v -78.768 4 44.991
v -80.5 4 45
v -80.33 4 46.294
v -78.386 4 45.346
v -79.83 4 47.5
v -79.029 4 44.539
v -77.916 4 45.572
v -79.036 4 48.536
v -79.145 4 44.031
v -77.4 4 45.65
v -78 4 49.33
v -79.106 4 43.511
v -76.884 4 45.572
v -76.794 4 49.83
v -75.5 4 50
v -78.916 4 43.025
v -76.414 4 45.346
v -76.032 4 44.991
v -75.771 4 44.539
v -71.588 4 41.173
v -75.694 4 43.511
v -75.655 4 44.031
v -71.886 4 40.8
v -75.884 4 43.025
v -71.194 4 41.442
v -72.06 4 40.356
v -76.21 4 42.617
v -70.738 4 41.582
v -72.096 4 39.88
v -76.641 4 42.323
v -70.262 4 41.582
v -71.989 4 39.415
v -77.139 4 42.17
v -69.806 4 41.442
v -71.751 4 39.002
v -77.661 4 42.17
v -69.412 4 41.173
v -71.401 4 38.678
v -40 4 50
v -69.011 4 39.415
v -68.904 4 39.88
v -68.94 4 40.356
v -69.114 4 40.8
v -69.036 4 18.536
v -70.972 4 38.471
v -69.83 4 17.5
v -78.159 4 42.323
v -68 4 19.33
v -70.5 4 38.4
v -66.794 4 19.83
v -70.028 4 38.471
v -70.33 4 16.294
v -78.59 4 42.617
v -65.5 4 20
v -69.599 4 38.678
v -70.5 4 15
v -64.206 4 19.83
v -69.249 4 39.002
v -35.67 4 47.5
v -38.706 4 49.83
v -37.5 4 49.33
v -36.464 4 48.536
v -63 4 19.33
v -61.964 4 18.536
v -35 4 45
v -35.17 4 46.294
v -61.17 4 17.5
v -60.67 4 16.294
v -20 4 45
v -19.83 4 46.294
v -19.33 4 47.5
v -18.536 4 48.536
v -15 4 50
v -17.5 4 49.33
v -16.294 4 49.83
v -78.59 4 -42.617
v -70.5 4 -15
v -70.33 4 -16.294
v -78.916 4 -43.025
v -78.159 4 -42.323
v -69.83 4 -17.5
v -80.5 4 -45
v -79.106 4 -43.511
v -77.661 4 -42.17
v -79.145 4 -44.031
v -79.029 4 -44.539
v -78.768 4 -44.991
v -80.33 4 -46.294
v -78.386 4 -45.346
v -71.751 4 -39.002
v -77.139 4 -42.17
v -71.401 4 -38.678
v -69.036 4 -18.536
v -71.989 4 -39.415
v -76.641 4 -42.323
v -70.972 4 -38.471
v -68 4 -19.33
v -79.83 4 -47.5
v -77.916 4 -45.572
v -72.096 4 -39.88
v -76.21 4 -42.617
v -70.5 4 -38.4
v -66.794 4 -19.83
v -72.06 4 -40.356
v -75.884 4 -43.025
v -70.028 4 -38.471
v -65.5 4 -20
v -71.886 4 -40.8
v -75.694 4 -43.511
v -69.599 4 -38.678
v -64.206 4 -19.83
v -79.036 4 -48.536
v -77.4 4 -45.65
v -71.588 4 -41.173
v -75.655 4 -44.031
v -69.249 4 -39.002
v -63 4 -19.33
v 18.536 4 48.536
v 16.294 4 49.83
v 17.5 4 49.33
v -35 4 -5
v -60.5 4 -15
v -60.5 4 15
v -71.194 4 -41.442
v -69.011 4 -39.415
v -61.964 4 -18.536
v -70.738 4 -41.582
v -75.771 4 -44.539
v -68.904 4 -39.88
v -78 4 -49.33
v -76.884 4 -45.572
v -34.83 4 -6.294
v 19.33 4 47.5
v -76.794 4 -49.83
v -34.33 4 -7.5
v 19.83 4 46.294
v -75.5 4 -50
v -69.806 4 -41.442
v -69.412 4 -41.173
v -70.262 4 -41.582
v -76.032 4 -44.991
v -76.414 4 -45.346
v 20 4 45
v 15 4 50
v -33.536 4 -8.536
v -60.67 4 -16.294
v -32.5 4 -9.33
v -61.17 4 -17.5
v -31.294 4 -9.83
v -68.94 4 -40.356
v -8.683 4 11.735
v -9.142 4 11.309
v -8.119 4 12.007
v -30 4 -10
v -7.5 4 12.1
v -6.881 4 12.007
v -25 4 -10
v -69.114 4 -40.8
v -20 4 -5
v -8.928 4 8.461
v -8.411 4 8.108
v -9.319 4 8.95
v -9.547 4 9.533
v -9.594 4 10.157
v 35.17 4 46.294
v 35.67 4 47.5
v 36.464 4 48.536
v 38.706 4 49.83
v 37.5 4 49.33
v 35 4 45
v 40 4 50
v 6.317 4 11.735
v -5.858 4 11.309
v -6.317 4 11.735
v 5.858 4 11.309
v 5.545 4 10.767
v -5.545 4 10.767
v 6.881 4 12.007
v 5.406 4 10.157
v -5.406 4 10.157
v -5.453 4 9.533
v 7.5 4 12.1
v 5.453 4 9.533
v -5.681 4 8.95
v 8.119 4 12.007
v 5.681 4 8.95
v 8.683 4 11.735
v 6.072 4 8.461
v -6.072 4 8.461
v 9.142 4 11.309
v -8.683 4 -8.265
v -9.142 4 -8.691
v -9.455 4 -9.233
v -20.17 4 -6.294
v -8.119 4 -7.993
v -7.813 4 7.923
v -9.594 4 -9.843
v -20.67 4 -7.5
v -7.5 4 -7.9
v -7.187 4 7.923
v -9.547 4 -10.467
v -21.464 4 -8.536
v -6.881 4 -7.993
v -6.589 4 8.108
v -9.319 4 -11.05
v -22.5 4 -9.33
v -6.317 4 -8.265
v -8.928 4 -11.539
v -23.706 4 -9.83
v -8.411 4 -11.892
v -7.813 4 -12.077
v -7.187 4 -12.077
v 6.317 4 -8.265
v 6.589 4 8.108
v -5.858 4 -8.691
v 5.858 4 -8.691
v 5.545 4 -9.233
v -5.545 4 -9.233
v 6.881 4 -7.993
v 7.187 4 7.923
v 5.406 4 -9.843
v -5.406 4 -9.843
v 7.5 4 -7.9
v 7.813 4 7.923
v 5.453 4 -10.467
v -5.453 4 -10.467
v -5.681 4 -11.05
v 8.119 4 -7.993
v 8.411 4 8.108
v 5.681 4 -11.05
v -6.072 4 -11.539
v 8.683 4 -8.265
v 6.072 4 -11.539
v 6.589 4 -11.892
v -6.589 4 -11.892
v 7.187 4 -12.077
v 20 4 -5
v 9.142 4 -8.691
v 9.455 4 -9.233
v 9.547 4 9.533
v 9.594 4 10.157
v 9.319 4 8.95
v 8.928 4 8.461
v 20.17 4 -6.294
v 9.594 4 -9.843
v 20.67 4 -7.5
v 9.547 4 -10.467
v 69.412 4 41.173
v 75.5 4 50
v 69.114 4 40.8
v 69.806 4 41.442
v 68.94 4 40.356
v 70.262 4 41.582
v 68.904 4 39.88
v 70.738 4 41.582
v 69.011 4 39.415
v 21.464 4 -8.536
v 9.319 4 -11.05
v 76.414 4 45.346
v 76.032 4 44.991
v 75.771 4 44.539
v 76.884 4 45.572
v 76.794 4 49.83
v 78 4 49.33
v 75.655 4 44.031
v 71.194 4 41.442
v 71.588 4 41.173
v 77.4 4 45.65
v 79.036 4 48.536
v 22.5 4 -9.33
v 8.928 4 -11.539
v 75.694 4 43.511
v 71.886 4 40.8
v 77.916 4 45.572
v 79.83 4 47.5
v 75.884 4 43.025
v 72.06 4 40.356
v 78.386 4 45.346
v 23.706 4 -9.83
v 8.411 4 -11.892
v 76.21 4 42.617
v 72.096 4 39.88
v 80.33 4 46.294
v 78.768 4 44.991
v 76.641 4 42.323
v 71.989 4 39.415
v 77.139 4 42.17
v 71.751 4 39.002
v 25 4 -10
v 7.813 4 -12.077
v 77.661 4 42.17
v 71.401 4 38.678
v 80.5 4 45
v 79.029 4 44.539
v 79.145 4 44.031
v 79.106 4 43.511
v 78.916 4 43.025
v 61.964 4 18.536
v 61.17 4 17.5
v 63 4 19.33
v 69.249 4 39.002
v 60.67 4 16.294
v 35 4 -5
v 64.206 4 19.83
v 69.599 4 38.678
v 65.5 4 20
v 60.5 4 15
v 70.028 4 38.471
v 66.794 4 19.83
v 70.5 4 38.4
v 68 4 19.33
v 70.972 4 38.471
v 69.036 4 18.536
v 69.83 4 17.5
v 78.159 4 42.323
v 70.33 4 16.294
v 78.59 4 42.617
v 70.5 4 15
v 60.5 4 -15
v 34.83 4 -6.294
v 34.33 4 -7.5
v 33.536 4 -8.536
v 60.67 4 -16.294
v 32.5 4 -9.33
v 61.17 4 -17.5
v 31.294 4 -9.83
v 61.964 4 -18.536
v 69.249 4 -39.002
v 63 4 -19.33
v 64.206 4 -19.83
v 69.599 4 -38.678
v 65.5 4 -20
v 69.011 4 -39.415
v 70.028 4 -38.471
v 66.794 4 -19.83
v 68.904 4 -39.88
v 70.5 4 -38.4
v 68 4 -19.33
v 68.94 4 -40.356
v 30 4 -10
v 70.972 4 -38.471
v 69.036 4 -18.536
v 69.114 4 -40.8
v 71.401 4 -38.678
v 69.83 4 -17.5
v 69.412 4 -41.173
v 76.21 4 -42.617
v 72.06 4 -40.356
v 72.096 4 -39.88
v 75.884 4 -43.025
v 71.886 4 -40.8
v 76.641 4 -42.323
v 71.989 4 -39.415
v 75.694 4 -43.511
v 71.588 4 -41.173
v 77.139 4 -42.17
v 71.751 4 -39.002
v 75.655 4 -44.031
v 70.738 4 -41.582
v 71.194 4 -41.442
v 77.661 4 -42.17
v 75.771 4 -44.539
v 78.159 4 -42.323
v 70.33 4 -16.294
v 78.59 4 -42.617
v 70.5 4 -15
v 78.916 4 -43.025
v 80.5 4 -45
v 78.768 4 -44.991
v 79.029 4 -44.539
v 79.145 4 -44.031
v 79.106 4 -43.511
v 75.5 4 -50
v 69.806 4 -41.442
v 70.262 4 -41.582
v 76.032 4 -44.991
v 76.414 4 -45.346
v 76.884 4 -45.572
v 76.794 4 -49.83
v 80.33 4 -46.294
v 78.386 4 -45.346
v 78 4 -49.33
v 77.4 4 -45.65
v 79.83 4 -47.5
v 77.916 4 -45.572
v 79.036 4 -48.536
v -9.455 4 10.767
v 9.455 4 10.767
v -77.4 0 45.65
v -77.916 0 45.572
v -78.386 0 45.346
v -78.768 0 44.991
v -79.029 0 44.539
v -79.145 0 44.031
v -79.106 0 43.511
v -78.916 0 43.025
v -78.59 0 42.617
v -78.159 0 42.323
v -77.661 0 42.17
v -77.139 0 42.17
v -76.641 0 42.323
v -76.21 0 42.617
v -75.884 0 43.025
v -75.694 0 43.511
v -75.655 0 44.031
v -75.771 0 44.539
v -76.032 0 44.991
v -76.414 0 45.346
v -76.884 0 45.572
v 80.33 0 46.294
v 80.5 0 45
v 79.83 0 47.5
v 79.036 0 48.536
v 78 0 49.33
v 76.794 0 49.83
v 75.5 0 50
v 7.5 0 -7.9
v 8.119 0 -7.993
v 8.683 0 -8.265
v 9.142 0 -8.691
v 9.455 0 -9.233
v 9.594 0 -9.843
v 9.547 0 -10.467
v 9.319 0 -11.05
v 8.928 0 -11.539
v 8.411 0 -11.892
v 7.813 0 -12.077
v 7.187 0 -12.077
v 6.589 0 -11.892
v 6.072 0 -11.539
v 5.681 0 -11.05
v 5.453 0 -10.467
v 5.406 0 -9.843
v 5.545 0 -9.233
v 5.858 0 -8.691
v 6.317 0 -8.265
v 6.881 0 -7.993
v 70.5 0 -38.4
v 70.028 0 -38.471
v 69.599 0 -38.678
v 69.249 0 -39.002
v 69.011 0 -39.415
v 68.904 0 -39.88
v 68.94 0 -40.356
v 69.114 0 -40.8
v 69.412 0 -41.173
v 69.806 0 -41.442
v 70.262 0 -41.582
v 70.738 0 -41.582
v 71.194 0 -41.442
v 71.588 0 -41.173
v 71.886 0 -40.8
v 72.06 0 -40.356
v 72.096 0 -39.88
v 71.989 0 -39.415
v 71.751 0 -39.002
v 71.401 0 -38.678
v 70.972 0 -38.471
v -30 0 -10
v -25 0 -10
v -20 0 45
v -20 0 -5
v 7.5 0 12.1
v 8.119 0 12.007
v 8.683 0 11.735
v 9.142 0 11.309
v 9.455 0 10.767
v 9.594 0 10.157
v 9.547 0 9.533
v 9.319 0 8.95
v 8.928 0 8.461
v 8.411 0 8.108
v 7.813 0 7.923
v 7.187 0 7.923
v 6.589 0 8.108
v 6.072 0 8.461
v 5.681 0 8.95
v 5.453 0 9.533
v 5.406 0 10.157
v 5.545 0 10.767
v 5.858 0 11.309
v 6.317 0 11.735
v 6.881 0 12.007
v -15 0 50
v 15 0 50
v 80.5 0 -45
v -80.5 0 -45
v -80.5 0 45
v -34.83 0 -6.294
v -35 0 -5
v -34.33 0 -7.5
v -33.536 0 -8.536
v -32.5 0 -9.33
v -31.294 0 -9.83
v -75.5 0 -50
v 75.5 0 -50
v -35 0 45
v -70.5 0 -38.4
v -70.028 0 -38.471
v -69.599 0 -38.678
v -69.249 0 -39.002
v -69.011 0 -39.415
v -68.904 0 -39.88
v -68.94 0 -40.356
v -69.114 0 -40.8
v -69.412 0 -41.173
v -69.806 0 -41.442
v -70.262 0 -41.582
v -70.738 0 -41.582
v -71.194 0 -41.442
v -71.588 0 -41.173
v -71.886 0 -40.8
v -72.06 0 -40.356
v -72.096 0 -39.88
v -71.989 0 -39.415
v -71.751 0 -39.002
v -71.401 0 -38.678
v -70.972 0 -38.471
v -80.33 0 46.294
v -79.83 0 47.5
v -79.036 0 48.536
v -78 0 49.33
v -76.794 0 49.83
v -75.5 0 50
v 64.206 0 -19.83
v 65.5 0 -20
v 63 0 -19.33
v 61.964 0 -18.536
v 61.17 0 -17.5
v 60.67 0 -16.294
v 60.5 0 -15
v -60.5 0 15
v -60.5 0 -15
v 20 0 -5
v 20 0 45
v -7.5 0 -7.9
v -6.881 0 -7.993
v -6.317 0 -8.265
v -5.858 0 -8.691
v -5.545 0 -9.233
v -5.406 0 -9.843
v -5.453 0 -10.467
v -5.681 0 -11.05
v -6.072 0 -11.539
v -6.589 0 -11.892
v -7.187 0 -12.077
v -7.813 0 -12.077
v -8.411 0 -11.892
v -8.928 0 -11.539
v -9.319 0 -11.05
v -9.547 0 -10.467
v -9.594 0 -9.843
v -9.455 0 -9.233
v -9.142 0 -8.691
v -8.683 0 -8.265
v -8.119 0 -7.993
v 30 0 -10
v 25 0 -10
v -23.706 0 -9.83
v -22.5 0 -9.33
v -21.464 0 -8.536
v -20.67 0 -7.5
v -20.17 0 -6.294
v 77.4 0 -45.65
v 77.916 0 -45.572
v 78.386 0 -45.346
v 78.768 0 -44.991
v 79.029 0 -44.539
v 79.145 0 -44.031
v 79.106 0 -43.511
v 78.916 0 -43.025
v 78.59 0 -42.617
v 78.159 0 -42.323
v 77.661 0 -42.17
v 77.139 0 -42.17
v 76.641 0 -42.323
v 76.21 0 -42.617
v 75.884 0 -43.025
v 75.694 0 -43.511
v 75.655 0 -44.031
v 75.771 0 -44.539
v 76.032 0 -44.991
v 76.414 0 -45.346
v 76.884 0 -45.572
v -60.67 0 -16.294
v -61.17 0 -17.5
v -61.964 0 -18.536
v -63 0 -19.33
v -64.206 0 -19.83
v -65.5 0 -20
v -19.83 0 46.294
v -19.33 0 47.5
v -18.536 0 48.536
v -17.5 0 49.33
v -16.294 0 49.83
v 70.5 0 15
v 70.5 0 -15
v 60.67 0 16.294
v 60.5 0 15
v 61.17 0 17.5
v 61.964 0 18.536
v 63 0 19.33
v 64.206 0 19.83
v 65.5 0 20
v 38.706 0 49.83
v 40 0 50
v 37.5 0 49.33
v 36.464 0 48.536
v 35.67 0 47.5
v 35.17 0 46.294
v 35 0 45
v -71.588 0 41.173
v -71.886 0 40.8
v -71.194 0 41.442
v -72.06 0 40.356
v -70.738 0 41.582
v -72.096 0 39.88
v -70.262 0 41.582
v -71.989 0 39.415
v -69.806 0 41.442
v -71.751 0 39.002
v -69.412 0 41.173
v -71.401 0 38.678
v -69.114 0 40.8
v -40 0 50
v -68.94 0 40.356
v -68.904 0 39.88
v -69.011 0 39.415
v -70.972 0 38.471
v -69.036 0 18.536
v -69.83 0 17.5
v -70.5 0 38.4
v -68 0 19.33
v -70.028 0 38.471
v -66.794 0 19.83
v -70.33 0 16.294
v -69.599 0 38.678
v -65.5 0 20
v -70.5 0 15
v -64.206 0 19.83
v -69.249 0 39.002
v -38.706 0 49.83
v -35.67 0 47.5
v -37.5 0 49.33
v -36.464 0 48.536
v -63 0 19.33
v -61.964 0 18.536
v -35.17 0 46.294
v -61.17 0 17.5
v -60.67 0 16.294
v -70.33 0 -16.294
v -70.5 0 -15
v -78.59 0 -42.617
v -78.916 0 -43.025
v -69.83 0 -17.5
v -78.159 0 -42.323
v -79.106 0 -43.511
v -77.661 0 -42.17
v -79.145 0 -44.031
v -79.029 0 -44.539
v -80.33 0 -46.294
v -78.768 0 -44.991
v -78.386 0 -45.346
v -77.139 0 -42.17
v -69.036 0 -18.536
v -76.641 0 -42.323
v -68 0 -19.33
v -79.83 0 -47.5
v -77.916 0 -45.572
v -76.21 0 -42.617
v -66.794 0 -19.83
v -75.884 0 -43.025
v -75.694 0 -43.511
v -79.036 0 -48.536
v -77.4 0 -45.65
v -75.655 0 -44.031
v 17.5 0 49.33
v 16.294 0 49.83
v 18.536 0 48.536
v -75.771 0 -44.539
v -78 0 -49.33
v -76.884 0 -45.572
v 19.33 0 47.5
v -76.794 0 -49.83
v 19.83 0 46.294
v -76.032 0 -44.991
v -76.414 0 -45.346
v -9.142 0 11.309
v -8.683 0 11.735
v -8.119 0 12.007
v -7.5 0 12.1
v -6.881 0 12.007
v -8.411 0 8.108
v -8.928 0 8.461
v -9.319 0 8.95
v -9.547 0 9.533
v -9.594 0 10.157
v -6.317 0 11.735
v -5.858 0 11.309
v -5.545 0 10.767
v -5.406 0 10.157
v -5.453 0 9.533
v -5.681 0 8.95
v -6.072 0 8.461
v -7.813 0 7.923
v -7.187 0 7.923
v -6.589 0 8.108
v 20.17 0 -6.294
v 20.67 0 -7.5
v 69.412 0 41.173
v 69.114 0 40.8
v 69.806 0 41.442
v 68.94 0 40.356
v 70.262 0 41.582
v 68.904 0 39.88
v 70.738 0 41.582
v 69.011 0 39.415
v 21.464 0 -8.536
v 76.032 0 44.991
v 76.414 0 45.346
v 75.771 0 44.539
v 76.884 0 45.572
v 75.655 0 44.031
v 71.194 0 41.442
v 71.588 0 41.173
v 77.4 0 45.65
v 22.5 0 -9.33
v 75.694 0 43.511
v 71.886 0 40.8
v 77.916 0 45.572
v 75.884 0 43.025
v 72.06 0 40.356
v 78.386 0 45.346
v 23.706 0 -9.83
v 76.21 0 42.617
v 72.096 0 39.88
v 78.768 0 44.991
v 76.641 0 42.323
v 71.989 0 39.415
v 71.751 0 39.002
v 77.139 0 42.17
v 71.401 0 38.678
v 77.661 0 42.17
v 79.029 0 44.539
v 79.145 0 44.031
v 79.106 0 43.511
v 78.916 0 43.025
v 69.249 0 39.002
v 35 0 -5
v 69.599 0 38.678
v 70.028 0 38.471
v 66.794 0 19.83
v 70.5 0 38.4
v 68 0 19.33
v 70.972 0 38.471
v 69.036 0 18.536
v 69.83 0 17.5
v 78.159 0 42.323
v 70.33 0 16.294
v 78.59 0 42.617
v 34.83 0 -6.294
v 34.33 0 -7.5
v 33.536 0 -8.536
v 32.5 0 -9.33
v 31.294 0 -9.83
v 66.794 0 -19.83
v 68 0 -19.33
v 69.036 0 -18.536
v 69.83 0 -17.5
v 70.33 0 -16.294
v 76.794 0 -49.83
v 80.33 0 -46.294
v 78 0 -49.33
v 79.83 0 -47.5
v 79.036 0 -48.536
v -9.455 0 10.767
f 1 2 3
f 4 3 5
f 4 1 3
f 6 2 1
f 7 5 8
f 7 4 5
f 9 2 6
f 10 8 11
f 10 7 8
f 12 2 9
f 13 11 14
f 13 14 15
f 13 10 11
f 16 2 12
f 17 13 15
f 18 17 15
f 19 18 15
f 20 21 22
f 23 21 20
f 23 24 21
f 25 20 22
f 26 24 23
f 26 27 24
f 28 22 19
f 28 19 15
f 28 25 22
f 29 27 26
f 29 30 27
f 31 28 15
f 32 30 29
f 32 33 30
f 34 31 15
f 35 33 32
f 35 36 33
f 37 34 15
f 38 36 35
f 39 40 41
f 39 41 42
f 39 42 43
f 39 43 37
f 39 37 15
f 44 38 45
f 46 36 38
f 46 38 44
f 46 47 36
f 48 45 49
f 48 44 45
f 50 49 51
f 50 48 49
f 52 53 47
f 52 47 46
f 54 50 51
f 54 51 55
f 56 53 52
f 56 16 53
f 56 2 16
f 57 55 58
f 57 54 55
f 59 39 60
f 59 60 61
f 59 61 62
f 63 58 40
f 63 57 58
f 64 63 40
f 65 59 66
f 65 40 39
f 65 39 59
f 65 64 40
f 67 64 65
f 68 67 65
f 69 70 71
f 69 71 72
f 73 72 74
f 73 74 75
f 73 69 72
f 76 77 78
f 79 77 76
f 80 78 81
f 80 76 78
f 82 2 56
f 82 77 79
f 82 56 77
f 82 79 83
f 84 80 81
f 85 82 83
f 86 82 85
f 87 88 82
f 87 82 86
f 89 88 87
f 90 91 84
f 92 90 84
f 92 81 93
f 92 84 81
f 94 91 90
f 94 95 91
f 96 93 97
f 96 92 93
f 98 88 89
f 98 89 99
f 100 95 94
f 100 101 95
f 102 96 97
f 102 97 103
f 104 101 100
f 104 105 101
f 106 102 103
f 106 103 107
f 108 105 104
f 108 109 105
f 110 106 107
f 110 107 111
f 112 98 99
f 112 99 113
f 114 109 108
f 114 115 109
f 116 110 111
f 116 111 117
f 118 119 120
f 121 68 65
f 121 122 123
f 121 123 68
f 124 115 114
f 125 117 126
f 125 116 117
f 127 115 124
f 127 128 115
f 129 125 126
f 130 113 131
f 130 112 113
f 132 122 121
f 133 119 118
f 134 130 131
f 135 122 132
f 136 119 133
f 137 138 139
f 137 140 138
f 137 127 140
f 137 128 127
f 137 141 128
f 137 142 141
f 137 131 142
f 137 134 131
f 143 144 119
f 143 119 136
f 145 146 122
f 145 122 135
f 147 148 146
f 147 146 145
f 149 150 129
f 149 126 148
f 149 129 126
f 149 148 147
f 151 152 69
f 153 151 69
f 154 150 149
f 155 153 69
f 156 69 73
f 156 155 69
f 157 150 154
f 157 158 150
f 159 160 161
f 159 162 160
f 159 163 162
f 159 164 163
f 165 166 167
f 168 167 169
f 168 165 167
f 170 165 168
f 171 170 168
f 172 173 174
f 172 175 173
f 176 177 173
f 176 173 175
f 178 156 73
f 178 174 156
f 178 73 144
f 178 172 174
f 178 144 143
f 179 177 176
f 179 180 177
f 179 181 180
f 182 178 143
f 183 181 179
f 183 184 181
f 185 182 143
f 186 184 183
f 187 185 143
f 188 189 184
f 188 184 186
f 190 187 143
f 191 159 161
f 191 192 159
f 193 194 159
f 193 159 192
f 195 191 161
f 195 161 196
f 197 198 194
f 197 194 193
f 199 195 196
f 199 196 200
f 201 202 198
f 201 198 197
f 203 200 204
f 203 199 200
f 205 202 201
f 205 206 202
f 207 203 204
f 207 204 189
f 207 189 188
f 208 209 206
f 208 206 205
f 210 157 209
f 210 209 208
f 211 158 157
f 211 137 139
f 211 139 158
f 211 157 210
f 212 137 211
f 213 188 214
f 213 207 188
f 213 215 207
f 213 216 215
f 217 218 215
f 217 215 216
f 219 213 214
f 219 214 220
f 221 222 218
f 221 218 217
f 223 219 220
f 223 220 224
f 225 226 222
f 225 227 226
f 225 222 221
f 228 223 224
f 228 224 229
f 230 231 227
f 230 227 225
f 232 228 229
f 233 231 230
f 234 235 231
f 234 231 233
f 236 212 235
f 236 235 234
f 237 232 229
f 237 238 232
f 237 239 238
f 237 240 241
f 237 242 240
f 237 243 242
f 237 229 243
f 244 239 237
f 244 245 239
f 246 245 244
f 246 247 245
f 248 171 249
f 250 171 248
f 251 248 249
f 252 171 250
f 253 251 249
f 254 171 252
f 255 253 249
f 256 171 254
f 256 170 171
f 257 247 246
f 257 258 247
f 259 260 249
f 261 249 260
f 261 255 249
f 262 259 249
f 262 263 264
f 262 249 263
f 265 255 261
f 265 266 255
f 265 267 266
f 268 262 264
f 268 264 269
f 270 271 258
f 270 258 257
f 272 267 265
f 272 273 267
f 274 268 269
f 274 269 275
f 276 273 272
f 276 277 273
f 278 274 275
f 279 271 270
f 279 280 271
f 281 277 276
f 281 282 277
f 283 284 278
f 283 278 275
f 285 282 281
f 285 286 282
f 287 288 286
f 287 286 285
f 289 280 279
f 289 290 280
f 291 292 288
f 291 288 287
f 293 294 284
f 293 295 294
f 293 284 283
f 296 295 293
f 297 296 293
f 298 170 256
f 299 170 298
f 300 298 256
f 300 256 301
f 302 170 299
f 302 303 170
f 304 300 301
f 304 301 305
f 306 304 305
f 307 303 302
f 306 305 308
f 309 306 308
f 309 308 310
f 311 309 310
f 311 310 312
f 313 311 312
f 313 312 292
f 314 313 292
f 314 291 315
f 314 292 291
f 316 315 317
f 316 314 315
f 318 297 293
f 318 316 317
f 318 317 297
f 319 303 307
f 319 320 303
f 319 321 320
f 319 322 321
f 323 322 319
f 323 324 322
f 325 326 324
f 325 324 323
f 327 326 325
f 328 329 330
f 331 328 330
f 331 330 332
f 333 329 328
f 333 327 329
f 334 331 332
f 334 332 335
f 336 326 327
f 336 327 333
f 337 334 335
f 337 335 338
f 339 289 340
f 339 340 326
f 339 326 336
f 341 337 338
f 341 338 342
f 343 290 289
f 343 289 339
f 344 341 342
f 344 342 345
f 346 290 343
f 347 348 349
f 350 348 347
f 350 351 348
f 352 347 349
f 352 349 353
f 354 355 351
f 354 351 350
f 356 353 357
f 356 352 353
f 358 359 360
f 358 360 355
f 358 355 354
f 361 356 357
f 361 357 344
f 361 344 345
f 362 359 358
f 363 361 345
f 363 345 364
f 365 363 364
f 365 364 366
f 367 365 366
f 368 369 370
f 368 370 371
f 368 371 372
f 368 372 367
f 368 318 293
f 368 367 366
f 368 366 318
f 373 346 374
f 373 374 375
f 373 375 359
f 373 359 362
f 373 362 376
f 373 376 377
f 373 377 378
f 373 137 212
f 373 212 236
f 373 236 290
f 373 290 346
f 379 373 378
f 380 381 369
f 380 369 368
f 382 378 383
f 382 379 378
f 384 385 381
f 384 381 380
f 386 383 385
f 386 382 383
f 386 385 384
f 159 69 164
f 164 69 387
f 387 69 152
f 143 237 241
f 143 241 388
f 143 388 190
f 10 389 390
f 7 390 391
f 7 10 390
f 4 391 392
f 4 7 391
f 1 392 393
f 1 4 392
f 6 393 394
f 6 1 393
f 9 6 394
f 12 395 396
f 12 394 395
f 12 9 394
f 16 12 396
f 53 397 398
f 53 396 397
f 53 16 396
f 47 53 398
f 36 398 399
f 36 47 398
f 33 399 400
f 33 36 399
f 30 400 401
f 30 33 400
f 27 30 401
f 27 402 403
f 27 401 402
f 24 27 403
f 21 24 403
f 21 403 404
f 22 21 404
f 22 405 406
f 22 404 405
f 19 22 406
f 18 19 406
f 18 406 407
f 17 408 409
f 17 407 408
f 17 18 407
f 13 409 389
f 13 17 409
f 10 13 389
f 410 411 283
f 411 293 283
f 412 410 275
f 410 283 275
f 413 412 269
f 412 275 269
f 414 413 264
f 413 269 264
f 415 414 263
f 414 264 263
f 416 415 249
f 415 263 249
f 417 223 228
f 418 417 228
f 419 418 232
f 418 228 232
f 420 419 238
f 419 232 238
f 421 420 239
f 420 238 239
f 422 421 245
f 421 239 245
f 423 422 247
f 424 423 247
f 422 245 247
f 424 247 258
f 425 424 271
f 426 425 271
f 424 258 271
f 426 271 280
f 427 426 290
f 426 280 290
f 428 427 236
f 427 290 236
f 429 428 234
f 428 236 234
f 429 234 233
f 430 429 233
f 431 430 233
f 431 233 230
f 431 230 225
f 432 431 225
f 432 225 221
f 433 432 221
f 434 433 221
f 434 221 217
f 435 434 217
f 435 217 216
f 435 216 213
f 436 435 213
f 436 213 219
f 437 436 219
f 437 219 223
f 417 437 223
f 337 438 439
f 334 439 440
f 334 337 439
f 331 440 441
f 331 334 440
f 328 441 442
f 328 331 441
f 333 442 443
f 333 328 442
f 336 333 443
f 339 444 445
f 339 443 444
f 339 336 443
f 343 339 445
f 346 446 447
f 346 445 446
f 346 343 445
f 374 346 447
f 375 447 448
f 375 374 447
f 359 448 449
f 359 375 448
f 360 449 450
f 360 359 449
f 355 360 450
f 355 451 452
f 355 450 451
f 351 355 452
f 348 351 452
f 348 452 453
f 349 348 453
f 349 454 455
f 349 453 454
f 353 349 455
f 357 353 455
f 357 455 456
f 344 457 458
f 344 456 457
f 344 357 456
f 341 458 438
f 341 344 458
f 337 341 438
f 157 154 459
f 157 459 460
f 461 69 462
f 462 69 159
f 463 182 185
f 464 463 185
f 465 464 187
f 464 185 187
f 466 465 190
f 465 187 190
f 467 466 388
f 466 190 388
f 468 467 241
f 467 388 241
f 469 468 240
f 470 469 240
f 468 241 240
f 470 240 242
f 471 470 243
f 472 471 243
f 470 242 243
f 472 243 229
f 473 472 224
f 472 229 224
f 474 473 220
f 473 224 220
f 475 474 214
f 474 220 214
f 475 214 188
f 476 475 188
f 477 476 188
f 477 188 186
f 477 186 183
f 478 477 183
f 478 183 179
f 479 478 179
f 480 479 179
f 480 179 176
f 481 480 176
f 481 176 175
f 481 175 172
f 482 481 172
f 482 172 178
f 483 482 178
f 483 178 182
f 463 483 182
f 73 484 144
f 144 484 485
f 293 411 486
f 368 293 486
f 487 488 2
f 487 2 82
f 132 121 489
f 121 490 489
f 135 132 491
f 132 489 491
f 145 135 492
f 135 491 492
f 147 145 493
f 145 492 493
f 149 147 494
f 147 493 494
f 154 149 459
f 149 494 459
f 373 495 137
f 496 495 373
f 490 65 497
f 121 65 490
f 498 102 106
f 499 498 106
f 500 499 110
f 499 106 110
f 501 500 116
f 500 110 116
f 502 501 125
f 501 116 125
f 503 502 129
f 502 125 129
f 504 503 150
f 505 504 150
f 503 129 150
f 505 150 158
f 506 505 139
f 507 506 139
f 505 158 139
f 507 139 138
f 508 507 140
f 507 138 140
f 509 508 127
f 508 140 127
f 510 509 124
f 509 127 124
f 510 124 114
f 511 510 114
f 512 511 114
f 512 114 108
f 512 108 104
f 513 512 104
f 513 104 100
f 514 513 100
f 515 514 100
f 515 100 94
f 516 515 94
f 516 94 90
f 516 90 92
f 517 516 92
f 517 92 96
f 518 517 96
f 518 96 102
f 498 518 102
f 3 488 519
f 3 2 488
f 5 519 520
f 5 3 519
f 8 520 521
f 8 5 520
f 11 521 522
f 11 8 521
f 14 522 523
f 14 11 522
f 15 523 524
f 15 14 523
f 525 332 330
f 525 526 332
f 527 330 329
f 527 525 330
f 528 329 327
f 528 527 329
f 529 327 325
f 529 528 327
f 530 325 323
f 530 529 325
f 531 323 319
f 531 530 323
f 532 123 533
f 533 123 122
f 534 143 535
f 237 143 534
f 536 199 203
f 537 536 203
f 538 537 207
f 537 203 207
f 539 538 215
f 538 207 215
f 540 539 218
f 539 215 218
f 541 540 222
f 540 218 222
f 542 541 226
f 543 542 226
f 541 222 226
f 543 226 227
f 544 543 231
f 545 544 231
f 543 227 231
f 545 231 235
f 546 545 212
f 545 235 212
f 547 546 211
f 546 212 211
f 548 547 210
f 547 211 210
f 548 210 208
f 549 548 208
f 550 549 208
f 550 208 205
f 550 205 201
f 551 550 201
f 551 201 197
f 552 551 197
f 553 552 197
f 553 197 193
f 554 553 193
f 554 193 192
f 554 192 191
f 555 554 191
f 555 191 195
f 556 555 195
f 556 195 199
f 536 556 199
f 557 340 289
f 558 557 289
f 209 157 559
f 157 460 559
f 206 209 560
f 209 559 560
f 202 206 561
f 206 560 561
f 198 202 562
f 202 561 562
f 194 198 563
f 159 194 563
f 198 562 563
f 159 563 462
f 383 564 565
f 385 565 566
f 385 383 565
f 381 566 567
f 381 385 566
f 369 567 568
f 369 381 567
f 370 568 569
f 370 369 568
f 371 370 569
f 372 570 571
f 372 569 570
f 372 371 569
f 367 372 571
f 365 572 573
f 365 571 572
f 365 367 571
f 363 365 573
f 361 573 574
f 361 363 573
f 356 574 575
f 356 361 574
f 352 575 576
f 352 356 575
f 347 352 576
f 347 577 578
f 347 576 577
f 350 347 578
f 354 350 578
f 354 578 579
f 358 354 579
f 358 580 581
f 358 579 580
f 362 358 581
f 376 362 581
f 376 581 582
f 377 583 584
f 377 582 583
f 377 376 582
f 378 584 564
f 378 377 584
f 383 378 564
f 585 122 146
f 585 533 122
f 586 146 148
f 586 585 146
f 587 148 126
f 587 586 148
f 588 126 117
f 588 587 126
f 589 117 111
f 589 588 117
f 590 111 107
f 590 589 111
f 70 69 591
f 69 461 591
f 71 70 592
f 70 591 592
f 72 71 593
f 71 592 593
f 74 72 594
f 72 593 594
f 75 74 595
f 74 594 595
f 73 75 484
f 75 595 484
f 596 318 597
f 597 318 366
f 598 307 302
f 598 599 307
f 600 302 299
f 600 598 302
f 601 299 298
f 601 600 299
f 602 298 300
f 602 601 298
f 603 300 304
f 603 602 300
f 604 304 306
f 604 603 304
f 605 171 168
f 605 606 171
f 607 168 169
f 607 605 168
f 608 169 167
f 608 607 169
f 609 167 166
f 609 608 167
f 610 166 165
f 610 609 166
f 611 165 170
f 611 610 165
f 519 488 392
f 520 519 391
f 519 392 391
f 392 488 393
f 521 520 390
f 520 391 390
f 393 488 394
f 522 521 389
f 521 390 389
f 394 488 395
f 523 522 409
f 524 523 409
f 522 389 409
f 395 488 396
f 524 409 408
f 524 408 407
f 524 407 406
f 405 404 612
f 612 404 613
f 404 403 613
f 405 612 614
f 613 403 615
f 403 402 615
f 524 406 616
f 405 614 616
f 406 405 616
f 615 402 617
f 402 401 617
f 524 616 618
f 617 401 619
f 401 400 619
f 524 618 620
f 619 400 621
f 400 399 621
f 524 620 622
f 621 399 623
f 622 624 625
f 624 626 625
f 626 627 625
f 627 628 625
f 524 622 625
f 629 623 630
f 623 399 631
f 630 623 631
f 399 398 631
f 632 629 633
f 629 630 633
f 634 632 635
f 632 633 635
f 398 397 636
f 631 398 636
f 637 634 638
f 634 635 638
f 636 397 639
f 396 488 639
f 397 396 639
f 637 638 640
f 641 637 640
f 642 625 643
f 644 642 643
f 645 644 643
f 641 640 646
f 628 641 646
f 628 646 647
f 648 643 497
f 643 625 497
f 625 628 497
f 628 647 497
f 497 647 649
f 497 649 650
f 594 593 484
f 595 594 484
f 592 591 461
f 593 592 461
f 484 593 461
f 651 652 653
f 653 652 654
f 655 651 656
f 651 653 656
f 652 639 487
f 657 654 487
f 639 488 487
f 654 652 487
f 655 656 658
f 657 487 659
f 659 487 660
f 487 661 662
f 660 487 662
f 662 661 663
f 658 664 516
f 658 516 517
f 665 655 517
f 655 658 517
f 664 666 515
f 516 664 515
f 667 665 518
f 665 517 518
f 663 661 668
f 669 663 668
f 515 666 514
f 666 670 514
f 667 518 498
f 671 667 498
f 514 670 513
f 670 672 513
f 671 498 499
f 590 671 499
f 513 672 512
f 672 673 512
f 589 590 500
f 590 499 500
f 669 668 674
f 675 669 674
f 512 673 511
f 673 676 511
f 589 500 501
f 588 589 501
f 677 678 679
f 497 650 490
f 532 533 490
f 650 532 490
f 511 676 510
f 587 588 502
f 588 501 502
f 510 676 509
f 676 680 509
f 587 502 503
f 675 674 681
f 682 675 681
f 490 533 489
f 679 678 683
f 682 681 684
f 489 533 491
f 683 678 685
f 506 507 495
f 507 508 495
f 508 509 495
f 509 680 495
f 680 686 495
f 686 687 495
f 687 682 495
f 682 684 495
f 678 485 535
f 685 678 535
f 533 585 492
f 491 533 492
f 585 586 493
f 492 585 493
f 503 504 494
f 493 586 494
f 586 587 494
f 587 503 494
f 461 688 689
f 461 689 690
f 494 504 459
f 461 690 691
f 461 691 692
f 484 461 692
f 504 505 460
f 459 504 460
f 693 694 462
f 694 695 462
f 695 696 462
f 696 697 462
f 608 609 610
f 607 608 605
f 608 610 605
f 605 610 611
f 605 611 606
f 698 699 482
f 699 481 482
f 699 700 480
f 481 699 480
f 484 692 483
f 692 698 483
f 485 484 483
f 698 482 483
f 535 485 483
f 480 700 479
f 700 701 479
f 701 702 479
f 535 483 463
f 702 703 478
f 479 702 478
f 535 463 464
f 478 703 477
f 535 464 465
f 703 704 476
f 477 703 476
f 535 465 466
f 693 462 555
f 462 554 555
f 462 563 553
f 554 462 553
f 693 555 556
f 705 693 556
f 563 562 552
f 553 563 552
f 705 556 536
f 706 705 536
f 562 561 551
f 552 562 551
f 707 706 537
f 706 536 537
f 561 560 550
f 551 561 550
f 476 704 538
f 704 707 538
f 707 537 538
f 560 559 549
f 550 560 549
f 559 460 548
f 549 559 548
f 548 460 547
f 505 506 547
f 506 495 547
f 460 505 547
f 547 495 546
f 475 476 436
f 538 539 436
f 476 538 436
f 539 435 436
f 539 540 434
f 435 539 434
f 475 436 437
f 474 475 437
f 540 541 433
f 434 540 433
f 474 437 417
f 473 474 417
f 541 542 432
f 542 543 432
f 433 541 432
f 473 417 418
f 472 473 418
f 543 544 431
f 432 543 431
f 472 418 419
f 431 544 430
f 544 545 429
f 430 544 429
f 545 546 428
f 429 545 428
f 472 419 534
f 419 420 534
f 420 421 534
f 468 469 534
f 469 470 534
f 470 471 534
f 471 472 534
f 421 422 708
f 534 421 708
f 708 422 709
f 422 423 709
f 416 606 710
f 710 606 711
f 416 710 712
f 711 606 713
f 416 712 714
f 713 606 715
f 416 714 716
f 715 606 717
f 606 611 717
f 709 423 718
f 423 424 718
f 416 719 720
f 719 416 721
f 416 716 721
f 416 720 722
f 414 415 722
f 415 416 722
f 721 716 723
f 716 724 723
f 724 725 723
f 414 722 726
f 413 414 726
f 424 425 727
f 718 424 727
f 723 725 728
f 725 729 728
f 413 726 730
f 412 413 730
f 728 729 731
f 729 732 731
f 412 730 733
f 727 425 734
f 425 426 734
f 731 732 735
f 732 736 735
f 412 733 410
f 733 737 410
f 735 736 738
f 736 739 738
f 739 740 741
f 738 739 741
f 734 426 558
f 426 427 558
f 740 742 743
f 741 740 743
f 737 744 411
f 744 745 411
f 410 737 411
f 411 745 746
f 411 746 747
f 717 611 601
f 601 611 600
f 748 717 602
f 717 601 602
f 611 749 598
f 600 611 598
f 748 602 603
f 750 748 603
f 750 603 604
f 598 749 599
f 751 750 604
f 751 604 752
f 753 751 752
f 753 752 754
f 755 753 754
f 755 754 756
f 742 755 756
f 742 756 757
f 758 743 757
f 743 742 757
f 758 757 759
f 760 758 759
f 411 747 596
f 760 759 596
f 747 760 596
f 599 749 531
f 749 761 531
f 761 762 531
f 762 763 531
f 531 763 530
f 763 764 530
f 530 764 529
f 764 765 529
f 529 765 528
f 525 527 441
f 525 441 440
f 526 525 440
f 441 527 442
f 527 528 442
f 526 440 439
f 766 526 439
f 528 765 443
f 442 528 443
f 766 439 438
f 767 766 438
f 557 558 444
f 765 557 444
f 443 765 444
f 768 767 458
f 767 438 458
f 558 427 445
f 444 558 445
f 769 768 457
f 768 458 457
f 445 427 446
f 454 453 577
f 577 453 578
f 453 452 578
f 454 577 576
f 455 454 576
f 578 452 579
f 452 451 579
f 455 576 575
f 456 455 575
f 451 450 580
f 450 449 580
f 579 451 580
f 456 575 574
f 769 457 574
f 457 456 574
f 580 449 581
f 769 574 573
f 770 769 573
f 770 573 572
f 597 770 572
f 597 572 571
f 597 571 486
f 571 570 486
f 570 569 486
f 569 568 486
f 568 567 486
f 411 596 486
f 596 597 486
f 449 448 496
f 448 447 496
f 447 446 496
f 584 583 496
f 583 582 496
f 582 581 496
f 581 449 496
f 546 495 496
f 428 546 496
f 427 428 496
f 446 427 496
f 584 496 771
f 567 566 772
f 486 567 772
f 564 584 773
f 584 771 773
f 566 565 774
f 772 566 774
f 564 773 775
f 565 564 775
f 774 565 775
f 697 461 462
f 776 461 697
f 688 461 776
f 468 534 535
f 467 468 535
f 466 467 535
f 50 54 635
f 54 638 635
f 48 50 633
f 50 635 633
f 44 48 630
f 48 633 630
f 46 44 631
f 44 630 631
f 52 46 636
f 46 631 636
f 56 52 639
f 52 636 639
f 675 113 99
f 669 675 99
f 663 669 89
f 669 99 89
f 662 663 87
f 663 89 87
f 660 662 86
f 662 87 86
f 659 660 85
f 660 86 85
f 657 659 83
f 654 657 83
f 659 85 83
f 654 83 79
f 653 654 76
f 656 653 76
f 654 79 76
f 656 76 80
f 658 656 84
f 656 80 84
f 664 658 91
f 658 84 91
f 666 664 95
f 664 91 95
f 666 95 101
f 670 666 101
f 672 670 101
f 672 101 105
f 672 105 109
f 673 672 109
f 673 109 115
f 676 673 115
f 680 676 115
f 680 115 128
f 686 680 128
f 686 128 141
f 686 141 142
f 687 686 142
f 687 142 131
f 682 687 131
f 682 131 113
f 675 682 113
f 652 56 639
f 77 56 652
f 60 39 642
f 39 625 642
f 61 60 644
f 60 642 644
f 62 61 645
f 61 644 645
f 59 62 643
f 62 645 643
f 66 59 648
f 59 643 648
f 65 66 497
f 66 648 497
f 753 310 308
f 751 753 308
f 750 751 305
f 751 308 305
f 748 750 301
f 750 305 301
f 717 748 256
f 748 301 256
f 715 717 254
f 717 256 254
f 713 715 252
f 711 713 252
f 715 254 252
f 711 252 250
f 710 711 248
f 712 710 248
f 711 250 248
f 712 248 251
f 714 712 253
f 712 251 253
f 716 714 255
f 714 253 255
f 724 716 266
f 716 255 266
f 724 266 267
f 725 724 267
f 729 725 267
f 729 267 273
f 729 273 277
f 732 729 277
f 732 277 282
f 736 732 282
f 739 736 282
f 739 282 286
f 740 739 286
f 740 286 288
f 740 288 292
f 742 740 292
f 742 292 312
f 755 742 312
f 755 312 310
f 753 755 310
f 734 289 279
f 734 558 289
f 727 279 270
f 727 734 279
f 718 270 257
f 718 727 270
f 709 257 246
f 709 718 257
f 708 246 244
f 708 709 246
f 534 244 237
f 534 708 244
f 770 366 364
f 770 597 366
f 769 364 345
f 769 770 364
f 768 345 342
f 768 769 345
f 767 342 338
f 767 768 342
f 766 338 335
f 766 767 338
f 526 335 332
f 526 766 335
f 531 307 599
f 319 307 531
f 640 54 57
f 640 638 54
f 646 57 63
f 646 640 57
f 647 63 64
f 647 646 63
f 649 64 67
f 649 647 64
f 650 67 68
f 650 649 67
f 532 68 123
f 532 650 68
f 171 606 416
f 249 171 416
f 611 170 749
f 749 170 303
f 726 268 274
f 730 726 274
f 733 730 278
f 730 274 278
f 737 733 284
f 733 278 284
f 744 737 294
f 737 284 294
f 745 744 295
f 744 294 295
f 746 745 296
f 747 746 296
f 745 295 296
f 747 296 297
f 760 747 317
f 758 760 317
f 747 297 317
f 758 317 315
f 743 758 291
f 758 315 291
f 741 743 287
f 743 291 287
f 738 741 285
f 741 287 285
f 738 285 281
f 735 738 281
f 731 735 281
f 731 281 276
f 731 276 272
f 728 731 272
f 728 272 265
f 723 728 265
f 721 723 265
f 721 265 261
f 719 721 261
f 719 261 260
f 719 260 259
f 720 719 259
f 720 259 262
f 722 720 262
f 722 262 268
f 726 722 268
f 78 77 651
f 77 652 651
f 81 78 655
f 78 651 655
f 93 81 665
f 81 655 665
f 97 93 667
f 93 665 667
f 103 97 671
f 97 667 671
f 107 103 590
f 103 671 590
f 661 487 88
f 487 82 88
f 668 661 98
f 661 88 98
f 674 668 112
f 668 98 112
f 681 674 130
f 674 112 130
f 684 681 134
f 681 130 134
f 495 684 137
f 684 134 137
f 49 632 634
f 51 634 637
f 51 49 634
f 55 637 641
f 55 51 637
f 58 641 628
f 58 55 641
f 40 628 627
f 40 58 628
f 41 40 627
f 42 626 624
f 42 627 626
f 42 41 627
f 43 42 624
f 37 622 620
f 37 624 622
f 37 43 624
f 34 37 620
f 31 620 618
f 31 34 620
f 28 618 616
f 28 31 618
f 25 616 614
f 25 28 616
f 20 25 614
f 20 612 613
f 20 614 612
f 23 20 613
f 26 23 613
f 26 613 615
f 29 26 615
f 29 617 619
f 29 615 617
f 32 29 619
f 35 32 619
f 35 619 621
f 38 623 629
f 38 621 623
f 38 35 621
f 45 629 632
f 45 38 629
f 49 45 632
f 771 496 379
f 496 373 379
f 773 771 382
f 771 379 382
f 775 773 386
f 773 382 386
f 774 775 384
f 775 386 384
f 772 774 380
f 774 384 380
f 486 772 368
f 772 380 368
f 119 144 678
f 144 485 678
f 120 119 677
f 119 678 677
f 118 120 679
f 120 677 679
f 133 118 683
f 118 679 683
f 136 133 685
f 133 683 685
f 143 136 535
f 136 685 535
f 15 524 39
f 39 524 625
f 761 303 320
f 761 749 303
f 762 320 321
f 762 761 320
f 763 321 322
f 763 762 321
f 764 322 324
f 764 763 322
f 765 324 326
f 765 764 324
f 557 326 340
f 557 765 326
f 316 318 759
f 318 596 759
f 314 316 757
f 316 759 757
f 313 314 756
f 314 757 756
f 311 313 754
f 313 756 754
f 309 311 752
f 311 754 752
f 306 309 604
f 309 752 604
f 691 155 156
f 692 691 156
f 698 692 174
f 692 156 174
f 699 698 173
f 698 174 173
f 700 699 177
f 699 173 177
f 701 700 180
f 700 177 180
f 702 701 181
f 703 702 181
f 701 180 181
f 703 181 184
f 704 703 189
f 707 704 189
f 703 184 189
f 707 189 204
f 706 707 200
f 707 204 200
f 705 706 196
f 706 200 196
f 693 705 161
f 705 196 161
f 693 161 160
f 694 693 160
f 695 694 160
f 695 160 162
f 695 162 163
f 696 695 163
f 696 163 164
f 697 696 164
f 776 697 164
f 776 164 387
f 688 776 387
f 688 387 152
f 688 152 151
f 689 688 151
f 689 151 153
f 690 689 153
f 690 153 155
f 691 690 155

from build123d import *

# Parameters (mm, degrees)
SKETCH1_W               = 161
SKETCH1_H               = 100
BOSS_EXTRUDE1_DEPTH     = 4
SKETCH2_R               = 1.75
CUT_EXTRUDE1_DEPTH      = 95.84856351
MIRROR2_COPY_1_SKETCH_R = 1.75
MIRROR2_COPY_1_DEPTH    = 95.84856351
SKETCH3_W               = 15
SKETCH3_H               = 60
CUT_EXTRUDE2_DEPTH      = 95.84856351
SKETCH4_R               = 1.6
CUT_EXTRUDE3_DEPTH      = 95.84856351
MIRROR5_COPY_1_SKETCH_R = 1.6
MIRROR5_COPY_1_DEPTH    = 95.84856351
SKETCH5_R               = 2.1
CUT_EXTRUDE4_DEPTH      = 95.84856351
SKETCH6_W               = 10
SKETCH6_H               = 40
CUT_EXTRUDE5_DEPTH      = 95.84856351
FILLET1_R               = 5


with BuildPart() as part:
    # Sketch1 → Boss-Extrude1 (new body)
    with BuildSketch(Plane(origin=(0, 0, 0), x_dir=(1, 0, 0), z_dir=(0, 1, 0))):
        Rectangle(SKETCH1_W, SKETCH1_H)
    extrude(amount=BOSS_EXTRUDE1_DEPTH)

    # Sketch2 → Cut-Extrude1 (cut, through all)
    with BuildSketch(Plane(origin=(0, 4, 0), x_dir=(1, 0, 0), z_dir=(0, 1, 0))):
        with Locations(Location((77.4, -43.9, 0), (0, 0, 270))):
            Circle(SKETCH2_R)
    cut_extrude1 = extrude(amount=-CUT_EXTRUDE1_DEPTH, mode=Mode.SUBTRACT)

    # Mirror1: Cut-Extrude1 across plane
    add(cut_extrude1.mirror(Plane.XY), mode=Mode.SUBTRACT)

    # Mirror2: Cut-Extrude1 across plane
    add(cut_extrude1.mirror(Plane(origin=(0, 0, 0), x_dir=(0, 0, 1), z_dir=(1, 0, 0))), mode=Mode.SUBTRACT)

    # Mirror2 copy 1 sketch → Mirror2 copy 1 (cut, through all)
    with BuildSketch(Plane(origin=(0, 4, 0), x_dir=(-1, 0, 0), z_dir=(0, 1, 0))):
        with Locations(Location((77.4, -43.9, 0), (0, 0, 270))):
            Circle(MIRROR2_COPY_1_SKETCH_R)
    extrude(amount=-MIRROR2_COPY_1_DEPTH, mode=Mode.SUBTRACT)

    # Sketch3 → Cut-Extrude2 (cut, through all)
    with BuildSketch(Plane(origin=(0, 4, 0), x_dir=(1, 0, 0), z_dir=(0, 1, 0))):
        with Locations((-27.5, -20)):
            Rectangle(SKETCH3_W, SKETCH3_H)
    cut_extrude2 = extrude(amount=-CUT_EXTRUDE2_DEPTH, mode=Mode.SUBTRACT)

    # Mirror3: Cut-Extrude2 across plane
    add(cut_extrude2.mirror(Plane(origin=(0, 0, 0), x_dir=(0, 0, 1), z_dir=(1, 0, 0))), mode=Mode.SUBTRACT)

    # Sketch4 → Cut-Extrude3 (cut, through all)
    with BuildSketch(Plane(origin=(0, 4, 0), x_dir=(1, 0, 0), z_dir=(0, 1, 0))):
        with Locations(Location((-70.5, 40, 0), (0, 0, 270))):
            Circle(SKETCH4_R)
    cut_extrude3 = extrude(amount=-CUT_EXTRUDE3_DEPTH, mode=Mode.SUBTRACT)

    # Mirror4: Cut-Extrude3 across plane
    add(cut_extrude3.mirror(Plane.XY), mode=Mode.SUBTRACT)

    # Mirror5: Cut-Extrude3 across plane
    add(cut_extrude3.mirror(Plane(origin=(0, 0, 0), x_dir=(0, 0, 1), z_dir=(1, 0, 0))), mode=Mode.SUBTRACT)

    # Mirror5 copy 1 sketch → Mirror5 copy 1 (cut, through all)
    with BuildSketch(Plane(origin=(0, 4, 0), x_dir=(-1, 0, 0), z_dir=(0, 1, 0))):
        with Locations(Location((-70.5, 40, 0), (0, 0, 270))):
            Circle(MIRROR5_COPY_1_SKETCH_R)
    extrude(amount=-MIRROR5_COPY_1_DEPTH, mode=Mode.SUBTRACT)

    # Sketch5 → Cut-Extrude4 (cut, through all)
    with BuildSketch(Plane(origin=(0, 4, 0), x_dir=(1, 0, 0), z_dir=(0, 1, 0))):
        with Locations(Location((-7.5, 10, 0), (0, 0, 270))):
            Circle(SKETCH5_R)
        with Locations(Location((7.5, 10, 0), (0, 0, 270))):
            Circle(SKETCH5_R)
        with Locations(Location((7.5, -10, 0), (0, 0, 270))):
            Circle(SKETCH5_R)
        with Locations(Location((-7.5, -10, 0), (0, 0, 270))):
            Circle(SKETCH5_R)
    extrude(amount=-CUT_EXTRUDE4_DEPTH, mode=Mode.SUBTRACT)

    # Sketch6 → Cut-Extrude5 (cut, through all)
    with BuildSketch(Plane(origin=(0, 4, 0), x_dir=(1, 0, 0), z_dir=(0, 1, 0))):
        with Locations((-65.5, 0)):
            Rectangle(SKETCH6_W, SKETCH6_H)
    cut_extrude5 = extrude(amount=-CUT_EXTRUDE5_DEPTH, mode=Mode.SUBTRACT)

    # Mirror6: Cut-Extrude5 across plane
    add(cut_extrude5.mirror(Plane(origin=(0, 0, 0), x_dir=(0, 0, 1), z_dir=(1, 0, 0))), mode=Mode.SUBTRACT)

    # Fillet1
    fillet1_edges = [part.edges().sort_by_distance(p)[0] for p in [
        (-20, 2, -10),
        (-35, 2, -10),
        (20, 2, -10),
        (35, 2, -10),
        (20, 2, 50),
        (35, 2, 50),
        (-20, 2, 50),
        (-35, 2, 50),
        (-80.5, 2, 50),
        (-80.5, 2, -50),
        (80.5, 2, -50),
        (80.5, 2, 50),
        (60.5, 2, -20),
        (70.5, 2, -20),
        (70.5, 2, 20),
        (60.5, 2, 20),
        (-70.5, 2, -20),
        (-60.5, 2, -20),
        (-60.5, 2, 20),
        (-70.5, 2, 20),
    ]]
    fillet(fillet1_edges, radius=FILLET1_R - 0.0001)  # a hair under: the kernel refuses the full size


solid = part.part
